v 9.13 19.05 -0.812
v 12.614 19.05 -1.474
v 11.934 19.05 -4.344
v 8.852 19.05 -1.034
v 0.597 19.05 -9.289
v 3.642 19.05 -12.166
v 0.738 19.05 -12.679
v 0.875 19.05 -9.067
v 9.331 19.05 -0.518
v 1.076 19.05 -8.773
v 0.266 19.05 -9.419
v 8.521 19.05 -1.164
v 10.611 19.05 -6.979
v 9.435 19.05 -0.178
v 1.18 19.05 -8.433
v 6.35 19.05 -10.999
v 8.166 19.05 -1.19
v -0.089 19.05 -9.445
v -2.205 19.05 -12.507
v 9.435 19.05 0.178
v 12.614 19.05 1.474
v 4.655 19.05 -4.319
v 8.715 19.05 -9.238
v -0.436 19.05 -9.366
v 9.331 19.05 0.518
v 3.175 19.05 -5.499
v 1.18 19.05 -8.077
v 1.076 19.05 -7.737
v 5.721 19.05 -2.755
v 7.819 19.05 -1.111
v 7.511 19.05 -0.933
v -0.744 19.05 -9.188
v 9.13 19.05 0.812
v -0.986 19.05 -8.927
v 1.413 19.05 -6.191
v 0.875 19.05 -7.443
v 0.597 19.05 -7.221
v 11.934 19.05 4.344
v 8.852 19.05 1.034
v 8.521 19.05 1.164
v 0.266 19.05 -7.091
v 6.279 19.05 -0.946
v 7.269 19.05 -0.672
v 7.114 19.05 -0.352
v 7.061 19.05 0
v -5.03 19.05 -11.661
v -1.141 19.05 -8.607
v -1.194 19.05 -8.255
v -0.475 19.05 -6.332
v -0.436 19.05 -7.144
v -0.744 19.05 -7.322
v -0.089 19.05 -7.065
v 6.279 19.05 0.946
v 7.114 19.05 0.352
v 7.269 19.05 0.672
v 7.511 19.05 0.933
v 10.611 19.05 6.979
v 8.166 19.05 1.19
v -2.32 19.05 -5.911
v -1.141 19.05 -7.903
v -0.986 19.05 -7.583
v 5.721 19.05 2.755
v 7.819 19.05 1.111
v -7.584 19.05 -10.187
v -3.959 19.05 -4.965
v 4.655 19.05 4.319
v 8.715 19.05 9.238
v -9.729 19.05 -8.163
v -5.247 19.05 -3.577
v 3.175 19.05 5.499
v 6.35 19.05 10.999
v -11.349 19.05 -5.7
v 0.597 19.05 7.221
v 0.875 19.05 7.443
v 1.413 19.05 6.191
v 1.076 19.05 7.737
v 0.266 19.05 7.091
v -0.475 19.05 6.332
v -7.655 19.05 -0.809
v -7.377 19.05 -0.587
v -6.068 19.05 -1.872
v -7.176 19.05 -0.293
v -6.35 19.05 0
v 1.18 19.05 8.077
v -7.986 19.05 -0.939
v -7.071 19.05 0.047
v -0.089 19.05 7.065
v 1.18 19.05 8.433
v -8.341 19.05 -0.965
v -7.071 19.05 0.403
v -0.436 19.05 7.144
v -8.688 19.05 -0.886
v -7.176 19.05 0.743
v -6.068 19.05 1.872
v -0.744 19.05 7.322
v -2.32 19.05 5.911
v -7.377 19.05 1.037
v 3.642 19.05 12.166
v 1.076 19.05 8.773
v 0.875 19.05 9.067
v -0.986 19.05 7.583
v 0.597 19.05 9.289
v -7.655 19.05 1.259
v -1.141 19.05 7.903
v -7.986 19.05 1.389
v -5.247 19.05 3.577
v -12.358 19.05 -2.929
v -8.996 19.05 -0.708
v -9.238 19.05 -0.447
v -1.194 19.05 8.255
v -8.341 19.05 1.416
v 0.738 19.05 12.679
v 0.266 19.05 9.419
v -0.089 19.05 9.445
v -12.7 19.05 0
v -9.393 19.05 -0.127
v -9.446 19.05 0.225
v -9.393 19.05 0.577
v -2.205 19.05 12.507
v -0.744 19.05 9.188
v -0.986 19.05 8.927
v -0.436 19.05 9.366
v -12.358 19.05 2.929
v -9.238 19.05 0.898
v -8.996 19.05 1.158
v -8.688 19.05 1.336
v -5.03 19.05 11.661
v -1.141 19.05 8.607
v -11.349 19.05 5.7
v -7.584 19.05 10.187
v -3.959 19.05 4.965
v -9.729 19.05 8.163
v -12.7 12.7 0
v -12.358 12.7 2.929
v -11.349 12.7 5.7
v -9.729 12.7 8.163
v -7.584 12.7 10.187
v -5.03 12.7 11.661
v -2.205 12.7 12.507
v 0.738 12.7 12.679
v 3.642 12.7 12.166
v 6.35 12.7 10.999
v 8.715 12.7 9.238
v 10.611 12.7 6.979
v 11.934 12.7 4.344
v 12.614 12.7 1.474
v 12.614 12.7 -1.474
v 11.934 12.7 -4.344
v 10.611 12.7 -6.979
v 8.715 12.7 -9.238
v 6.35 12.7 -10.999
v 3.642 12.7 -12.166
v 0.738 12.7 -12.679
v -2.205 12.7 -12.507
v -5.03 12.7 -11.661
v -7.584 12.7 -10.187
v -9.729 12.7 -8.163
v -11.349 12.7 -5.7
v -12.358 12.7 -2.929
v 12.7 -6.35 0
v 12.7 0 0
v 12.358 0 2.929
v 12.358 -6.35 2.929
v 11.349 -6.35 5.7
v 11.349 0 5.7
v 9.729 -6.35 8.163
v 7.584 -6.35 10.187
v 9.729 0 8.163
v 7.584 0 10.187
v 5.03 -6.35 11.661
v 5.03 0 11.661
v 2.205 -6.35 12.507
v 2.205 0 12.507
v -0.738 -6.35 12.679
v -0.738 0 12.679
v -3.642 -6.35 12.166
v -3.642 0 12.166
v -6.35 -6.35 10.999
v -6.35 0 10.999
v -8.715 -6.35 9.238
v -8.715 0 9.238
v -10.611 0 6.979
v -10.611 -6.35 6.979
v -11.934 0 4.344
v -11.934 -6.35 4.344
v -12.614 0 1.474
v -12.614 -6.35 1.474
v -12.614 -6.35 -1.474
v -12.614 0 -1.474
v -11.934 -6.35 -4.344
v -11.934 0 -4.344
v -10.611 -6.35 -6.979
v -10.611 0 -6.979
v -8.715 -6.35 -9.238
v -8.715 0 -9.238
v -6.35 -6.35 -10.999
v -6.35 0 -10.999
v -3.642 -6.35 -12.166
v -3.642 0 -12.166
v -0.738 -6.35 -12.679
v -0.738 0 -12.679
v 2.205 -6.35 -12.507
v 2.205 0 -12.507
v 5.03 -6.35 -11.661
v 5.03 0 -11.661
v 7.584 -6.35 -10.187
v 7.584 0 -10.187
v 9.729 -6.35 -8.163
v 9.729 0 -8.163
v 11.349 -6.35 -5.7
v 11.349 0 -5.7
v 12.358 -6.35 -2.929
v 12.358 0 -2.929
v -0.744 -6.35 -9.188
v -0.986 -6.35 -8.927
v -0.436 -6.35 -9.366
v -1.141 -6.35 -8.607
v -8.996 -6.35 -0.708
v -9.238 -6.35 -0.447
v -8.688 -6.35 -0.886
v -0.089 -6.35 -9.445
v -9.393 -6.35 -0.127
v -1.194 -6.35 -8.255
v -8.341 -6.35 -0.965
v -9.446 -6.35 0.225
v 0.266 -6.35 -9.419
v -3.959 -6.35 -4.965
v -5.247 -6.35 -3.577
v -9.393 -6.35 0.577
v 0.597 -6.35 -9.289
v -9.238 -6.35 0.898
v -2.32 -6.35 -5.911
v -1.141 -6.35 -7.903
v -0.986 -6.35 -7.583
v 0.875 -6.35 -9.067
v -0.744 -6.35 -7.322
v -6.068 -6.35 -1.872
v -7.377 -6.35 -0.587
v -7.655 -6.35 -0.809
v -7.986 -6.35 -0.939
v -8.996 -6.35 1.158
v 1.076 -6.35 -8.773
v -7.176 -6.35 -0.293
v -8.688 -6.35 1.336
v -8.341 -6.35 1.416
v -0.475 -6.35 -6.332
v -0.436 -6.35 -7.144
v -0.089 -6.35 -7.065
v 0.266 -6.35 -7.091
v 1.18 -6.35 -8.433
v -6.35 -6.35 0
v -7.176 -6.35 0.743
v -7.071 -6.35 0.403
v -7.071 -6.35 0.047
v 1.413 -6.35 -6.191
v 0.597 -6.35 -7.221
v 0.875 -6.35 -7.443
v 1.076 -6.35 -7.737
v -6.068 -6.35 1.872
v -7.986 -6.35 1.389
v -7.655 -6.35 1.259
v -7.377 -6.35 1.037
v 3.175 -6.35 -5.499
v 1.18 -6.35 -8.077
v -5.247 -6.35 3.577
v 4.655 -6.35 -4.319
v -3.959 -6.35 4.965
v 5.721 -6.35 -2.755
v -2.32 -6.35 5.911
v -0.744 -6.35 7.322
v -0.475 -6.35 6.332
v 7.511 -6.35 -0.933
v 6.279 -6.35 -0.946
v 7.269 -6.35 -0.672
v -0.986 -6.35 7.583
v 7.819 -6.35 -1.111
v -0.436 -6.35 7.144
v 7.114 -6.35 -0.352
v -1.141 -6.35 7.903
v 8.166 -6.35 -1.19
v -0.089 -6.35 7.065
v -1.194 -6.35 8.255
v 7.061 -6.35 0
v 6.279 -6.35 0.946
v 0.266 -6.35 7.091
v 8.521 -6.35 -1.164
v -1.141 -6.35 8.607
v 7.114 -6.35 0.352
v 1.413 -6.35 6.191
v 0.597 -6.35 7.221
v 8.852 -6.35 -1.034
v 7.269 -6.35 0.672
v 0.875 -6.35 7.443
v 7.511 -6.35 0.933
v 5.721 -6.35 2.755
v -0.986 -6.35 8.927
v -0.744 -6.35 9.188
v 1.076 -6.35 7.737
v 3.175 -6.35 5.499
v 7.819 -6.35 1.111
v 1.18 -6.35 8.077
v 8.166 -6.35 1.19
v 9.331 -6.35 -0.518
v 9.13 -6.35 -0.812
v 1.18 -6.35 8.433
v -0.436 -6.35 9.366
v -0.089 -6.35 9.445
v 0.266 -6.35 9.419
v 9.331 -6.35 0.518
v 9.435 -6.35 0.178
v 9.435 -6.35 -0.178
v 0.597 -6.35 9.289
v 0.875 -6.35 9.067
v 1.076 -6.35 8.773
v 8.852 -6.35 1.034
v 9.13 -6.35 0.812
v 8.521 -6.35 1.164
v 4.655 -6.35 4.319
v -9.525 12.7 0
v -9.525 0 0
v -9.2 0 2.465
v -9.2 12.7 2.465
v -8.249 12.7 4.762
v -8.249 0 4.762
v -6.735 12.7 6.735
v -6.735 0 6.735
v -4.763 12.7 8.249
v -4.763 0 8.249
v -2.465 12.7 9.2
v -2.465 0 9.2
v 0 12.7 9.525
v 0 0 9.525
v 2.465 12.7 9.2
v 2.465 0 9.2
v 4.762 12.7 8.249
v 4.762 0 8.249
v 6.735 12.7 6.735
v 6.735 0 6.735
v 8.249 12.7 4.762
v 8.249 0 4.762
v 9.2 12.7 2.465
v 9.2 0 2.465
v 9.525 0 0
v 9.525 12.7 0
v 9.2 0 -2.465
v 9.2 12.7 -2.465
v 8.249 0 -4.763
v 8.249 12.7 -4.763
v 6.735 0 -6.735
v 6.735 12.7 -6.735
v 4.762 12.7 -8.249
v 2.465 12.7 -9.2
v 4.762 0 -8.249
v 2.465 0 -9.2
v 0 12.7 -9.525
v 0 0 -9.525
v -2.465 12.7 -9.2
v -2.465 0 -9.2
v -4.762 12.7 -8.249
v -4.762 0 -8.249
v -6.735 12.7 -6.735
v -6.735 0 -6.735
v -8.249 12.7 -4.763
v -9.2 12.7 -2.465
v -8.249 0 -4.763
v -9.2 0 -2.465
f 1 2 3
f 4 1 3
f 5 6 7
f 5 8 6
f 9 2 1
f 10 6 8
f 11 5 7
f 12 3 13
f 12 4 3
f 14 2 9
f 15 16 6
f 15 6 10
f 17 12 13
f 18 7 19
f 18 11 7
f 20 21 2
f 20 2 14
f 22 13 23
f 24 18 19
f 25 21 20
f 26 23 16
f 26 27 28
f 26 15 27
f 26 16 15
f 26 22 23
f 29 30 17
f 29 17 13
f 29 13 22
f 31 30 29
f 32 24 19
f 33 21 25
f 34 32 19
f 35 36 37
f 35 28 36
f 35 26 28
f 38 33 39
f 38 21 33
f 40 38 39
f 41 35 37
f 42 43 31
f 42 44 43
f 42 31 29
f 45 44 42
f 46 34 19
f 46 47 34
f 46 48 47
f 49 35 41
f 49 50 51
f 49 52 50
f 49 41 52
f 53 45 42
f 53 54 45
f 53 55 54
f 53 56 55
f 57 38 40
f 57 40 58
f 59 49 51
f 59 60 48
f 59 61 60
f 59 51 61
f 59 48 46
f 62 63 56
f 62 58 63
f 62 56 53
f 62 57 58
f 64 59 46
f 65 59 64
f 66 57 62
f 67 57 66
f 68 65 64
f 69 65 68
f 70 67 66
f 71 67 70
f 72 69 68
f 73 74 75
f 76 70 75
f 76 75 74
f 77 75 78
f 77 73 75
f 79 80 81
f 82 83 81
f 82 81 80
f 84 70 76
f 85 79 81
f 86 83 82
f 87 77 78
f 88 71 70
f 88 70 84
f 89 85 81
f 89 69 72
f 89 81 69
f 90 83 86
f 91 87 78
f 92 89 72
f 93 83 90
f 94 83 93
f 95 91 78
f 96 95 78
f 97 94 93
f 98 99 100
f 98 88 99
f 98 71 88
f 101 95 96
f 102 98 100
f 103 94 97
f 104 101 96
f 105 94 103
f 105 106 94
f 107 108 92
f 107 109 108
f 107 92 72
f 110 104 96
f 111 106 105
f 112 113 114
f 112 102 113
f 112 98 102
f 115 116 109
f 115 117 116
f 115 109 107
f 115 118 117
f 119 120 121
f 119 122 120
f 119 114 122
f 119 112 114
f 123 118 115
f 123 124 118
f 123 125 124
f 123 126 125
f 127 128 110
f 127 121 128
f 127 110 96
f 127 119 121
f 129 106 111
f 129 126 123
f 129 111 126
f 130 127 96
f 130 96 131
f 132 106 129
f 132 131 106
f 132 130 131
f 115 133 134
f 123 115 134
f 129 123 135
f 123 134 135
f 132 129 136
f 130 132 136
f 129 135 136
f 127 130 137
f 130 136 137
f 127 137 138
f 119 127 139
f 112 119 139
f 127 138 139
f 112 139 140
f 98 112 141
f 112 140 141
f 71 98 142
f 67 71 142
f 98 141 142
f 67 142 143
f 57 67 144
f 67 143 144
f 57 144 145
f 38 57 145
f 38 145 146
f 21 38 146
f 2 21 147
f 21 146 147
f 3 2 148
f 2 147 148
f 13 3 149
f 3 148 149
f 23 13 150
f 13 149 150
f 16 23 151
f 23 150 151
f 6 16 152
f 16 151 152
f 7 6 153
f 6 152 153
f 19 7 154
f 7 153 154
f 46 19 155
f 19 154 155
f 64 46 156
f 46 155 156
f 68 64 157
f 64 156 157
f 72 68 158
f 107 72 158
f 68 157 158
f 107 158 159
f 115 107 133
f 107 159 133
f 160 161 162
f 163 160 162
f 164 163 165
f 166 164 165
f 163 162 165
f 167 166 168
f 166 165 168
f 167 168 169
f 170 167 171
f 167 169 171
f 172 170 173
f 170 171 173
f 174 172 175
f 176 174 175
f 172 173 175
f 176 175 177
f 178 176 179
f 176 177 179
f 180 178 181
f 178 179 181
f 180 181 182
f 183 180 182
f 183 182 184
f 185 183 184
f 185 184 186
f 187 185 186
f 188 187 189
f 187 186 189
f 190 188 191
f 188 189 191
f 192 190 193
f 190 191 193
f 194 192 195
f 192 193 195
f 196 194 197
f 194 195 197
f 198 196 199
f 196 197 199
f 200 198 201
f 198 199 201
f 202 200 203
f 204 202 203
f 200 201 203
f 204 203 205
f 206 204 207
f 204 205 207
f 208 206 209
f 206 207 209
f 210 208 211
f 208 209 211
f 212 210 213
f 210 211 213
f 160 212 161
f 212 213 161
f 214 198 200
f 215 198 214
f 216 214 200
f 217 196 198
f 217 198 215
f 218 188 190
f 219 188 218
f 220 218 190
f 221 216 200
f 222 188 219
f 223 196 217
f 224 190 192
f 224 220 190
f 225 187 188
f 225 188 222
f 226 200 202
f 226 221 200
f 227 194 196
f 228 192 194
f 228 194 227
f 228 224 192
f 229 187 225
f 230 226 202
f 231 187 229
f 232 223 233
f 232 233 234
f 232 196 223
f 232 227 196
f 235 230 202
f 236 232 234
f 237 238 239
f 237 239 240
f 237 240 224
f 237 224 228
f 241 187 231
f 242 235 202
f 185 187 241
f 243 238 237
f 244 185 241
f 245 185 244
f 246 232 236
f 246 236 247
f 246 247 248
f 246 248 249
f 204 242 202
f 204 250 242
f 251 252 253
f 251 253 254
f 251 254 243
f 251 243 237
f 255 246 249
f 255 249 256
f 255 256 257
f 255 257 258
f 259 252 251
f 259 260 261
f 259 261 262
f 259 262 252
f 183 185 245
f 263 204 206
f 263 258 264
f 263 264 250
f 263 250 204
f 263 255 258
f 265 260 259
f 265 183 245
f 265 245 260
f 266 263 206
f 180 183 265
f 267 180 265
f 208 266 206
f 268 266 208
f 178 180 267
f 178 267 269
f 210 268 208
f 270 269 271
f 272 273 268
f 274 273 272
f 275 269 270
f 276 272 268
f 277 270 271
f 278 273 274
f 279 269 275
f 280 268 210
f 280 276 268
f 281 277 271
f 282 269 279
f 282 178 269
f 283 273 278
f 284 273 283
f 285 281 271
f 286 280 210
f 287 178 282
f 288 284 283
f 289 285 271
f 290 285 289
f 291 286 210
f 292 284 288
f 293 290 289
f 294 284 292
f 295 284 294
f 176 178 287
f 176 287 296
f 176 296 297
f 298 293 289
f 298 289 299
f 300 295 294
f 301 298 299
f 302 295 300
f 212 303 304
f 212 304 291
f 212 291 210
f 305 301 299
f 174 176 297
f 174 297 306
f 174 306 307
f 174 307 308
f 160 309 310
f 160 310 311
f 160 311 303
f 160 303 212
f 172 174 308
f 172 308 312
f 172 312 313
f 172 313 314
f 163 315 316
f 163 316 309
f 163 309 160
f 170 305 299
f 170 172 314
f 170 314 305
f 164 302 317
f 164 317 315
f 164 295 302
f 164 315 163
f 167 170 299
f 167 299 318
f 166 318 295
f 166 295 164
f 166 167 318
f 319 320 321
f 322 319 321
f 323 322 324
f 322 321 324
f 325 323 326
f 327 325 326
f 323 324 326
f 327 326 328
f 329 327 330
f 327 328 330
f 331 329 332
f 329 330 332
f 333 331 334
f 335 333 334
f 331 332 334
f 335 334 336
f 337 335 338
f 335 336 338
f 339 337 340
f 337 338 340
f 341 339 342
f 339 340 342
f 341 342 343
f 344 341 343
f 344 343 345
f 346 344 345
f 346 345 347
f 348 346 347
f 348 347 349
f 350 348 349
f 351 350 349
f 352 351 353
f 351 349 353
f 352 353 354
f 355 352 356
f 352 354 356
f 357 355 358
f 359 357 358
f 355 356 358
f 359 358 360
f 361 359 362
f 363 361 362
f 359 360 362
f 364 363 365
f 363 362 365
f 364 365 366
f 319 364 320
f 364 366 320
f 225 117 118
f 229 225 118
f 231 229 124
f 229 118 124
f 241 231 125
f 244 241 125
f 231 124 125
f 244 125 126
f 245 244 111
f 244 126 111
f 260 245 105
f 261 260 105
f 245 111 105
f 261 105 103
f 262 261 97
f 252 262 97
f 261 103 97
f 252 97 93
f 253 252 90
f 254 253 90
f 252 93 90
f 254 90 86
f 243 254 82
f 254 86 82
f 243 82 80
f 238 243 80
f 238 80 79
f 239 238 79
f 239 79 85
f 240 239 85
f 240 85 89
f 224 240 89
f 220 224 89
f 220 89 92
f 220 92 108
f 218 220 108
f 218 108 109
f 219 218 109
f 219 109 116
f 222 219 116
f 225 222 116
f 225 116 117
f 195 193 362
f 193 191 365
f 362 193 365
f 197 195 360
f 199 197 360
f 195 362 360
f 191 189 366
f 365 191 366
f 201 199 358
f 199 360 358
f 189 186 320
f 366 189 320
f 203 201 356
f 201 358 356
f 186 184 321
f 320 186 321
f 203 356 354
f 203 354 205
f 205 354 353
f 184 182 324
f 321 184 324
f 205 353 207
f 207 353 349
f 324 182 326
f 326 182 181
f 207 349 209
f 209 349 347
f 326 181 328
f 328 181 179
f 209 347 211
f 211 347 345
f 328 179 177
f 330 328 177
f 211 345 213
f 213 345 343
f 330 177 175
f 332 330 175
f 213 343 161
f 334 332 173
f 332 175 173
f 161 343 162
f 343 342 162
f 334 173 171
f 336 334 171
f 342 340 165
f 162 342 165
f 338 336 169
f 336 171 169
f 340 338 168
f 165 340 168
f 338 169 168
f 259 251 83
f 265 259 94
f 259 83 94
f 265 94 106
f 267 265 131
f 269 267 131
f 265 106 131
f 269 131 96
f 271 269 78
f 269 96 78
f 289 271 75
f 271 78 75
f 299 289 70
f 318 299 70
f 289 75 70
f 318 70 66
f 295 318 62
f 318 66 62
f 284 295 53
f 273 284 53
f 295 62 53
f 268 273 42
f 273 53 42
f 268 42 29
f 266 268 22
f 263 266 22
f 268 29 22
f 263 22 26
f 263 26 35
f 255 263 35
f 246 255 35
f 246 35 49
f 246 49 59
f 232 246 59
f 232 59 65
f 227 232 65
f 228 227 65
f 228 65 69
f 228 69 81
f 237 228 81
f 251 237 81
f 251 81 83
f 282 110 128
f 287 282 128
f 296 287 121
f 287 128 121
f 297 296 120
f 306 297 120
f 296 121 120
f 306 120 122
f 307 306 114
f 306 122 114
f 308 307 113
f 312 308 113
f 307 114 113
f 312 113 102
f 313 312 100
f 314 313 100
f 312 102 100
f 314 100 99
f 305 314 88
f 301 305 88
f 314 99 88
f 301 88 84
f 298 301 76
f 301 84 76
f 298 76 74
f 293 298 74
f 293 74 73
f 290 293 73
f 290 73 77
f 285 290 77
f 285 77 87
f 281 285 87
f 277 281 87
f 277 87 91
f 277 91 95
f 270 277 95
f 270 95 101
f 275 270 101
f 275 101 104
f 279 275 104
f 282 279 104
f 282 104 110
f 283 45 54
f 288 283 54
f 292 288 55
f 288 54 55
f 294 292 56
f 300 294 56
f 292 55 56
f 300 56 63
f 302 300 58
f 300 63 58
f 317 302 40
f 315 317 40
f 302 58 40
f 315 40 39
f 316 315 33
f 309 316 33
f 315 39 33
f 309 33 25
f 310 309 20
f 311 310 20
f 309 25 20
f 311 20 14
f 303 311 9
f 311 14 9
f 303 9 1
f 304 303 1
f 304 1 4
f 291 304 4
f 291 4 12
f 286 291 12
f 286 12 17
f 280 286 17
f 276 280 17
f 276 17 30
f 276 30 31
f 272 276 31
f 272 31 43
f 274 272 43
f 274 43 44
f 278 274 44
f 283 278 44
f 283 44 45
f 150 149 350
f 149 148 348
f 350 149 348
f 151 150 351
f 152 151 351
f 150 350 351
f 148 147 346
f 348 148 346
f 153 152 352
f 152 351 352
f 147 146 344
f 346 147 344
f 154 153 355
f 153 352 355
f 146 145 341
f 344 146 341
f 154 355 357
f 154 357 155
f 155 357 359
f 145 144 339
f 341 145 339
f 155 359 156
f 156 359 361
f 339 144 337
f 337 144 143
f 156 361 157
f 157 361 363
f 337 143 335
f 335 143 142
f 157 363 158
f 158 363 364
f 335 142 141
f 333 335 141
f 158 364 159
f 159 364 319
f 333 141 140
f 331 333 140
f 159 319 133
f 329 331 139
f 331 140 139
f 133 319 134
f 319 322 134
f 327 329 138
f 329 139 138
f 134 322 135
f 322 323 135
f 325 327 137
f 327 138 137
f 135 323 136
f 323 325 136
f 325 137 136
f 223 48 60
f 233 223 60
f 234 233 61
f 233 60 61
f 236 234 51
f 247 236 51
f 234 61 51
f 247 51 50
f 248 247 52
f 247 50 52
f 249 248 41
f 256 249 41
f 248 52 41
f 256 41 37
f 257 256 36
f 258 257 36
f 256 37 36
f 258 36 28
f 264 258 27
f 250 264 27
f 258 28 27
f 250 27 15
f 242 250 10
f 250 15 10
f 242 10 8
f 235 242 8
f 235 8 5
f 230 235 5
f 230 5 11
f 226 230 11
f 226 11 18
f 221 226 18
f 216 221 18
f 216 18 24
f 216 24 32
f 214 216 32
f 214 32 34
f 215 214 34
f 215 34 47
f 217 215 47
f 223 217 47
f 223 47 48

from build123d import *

# Parameters (mm, degrees)
F0_R     = 12.7
F1_DEPTH = 6.35
F2_R     = 9.525
F3_DEPTH = 12.7
F4_R     = 12.7
F5_DEPTH = 6.35
F7_D     = 12.7
F8_D     = 2.3876


with BuildPart() as f1:
    # F0 (on Front) → F1 (new body)
    with BuildSketch(Plane.XZ):
        Circle(F0_R)
    extrude(amount=F1_DEPTH)

    # F2 (on face) → F3 (join)
    with BuildSketch(Plane(origin=(0, 0, 0), x_dir=(-1, 0, 0), z_dir=(0, 1, 0))):
        Circle(F2_R)
    extrude(amount=F3_DEPTH)

    # F4 (on face) → F5 (join)
    with BuildSketch(Plane(origin=(0, 12.7, 0), x_dir=(-1, 0, 0), z_dir=(0, 1, 0))):
        Circle(F4_R)
    extrude(amount=F5_DEPTH)

    # F7 (through all)
    with Locations(Plane.XZ.offset(6.35)):
        with Locations((0, 0)):
            Hole(F7_D / 2)

    # F8 (through all)
    with Locations(Plane.XZ.offset(6.35)):
        with Locations((0, 8.255), (-8.2519316698, 0.2250526986), (0, -8.255), (8.255, 0)):
            Hole(F8_D / 2)


solid = f1.part
